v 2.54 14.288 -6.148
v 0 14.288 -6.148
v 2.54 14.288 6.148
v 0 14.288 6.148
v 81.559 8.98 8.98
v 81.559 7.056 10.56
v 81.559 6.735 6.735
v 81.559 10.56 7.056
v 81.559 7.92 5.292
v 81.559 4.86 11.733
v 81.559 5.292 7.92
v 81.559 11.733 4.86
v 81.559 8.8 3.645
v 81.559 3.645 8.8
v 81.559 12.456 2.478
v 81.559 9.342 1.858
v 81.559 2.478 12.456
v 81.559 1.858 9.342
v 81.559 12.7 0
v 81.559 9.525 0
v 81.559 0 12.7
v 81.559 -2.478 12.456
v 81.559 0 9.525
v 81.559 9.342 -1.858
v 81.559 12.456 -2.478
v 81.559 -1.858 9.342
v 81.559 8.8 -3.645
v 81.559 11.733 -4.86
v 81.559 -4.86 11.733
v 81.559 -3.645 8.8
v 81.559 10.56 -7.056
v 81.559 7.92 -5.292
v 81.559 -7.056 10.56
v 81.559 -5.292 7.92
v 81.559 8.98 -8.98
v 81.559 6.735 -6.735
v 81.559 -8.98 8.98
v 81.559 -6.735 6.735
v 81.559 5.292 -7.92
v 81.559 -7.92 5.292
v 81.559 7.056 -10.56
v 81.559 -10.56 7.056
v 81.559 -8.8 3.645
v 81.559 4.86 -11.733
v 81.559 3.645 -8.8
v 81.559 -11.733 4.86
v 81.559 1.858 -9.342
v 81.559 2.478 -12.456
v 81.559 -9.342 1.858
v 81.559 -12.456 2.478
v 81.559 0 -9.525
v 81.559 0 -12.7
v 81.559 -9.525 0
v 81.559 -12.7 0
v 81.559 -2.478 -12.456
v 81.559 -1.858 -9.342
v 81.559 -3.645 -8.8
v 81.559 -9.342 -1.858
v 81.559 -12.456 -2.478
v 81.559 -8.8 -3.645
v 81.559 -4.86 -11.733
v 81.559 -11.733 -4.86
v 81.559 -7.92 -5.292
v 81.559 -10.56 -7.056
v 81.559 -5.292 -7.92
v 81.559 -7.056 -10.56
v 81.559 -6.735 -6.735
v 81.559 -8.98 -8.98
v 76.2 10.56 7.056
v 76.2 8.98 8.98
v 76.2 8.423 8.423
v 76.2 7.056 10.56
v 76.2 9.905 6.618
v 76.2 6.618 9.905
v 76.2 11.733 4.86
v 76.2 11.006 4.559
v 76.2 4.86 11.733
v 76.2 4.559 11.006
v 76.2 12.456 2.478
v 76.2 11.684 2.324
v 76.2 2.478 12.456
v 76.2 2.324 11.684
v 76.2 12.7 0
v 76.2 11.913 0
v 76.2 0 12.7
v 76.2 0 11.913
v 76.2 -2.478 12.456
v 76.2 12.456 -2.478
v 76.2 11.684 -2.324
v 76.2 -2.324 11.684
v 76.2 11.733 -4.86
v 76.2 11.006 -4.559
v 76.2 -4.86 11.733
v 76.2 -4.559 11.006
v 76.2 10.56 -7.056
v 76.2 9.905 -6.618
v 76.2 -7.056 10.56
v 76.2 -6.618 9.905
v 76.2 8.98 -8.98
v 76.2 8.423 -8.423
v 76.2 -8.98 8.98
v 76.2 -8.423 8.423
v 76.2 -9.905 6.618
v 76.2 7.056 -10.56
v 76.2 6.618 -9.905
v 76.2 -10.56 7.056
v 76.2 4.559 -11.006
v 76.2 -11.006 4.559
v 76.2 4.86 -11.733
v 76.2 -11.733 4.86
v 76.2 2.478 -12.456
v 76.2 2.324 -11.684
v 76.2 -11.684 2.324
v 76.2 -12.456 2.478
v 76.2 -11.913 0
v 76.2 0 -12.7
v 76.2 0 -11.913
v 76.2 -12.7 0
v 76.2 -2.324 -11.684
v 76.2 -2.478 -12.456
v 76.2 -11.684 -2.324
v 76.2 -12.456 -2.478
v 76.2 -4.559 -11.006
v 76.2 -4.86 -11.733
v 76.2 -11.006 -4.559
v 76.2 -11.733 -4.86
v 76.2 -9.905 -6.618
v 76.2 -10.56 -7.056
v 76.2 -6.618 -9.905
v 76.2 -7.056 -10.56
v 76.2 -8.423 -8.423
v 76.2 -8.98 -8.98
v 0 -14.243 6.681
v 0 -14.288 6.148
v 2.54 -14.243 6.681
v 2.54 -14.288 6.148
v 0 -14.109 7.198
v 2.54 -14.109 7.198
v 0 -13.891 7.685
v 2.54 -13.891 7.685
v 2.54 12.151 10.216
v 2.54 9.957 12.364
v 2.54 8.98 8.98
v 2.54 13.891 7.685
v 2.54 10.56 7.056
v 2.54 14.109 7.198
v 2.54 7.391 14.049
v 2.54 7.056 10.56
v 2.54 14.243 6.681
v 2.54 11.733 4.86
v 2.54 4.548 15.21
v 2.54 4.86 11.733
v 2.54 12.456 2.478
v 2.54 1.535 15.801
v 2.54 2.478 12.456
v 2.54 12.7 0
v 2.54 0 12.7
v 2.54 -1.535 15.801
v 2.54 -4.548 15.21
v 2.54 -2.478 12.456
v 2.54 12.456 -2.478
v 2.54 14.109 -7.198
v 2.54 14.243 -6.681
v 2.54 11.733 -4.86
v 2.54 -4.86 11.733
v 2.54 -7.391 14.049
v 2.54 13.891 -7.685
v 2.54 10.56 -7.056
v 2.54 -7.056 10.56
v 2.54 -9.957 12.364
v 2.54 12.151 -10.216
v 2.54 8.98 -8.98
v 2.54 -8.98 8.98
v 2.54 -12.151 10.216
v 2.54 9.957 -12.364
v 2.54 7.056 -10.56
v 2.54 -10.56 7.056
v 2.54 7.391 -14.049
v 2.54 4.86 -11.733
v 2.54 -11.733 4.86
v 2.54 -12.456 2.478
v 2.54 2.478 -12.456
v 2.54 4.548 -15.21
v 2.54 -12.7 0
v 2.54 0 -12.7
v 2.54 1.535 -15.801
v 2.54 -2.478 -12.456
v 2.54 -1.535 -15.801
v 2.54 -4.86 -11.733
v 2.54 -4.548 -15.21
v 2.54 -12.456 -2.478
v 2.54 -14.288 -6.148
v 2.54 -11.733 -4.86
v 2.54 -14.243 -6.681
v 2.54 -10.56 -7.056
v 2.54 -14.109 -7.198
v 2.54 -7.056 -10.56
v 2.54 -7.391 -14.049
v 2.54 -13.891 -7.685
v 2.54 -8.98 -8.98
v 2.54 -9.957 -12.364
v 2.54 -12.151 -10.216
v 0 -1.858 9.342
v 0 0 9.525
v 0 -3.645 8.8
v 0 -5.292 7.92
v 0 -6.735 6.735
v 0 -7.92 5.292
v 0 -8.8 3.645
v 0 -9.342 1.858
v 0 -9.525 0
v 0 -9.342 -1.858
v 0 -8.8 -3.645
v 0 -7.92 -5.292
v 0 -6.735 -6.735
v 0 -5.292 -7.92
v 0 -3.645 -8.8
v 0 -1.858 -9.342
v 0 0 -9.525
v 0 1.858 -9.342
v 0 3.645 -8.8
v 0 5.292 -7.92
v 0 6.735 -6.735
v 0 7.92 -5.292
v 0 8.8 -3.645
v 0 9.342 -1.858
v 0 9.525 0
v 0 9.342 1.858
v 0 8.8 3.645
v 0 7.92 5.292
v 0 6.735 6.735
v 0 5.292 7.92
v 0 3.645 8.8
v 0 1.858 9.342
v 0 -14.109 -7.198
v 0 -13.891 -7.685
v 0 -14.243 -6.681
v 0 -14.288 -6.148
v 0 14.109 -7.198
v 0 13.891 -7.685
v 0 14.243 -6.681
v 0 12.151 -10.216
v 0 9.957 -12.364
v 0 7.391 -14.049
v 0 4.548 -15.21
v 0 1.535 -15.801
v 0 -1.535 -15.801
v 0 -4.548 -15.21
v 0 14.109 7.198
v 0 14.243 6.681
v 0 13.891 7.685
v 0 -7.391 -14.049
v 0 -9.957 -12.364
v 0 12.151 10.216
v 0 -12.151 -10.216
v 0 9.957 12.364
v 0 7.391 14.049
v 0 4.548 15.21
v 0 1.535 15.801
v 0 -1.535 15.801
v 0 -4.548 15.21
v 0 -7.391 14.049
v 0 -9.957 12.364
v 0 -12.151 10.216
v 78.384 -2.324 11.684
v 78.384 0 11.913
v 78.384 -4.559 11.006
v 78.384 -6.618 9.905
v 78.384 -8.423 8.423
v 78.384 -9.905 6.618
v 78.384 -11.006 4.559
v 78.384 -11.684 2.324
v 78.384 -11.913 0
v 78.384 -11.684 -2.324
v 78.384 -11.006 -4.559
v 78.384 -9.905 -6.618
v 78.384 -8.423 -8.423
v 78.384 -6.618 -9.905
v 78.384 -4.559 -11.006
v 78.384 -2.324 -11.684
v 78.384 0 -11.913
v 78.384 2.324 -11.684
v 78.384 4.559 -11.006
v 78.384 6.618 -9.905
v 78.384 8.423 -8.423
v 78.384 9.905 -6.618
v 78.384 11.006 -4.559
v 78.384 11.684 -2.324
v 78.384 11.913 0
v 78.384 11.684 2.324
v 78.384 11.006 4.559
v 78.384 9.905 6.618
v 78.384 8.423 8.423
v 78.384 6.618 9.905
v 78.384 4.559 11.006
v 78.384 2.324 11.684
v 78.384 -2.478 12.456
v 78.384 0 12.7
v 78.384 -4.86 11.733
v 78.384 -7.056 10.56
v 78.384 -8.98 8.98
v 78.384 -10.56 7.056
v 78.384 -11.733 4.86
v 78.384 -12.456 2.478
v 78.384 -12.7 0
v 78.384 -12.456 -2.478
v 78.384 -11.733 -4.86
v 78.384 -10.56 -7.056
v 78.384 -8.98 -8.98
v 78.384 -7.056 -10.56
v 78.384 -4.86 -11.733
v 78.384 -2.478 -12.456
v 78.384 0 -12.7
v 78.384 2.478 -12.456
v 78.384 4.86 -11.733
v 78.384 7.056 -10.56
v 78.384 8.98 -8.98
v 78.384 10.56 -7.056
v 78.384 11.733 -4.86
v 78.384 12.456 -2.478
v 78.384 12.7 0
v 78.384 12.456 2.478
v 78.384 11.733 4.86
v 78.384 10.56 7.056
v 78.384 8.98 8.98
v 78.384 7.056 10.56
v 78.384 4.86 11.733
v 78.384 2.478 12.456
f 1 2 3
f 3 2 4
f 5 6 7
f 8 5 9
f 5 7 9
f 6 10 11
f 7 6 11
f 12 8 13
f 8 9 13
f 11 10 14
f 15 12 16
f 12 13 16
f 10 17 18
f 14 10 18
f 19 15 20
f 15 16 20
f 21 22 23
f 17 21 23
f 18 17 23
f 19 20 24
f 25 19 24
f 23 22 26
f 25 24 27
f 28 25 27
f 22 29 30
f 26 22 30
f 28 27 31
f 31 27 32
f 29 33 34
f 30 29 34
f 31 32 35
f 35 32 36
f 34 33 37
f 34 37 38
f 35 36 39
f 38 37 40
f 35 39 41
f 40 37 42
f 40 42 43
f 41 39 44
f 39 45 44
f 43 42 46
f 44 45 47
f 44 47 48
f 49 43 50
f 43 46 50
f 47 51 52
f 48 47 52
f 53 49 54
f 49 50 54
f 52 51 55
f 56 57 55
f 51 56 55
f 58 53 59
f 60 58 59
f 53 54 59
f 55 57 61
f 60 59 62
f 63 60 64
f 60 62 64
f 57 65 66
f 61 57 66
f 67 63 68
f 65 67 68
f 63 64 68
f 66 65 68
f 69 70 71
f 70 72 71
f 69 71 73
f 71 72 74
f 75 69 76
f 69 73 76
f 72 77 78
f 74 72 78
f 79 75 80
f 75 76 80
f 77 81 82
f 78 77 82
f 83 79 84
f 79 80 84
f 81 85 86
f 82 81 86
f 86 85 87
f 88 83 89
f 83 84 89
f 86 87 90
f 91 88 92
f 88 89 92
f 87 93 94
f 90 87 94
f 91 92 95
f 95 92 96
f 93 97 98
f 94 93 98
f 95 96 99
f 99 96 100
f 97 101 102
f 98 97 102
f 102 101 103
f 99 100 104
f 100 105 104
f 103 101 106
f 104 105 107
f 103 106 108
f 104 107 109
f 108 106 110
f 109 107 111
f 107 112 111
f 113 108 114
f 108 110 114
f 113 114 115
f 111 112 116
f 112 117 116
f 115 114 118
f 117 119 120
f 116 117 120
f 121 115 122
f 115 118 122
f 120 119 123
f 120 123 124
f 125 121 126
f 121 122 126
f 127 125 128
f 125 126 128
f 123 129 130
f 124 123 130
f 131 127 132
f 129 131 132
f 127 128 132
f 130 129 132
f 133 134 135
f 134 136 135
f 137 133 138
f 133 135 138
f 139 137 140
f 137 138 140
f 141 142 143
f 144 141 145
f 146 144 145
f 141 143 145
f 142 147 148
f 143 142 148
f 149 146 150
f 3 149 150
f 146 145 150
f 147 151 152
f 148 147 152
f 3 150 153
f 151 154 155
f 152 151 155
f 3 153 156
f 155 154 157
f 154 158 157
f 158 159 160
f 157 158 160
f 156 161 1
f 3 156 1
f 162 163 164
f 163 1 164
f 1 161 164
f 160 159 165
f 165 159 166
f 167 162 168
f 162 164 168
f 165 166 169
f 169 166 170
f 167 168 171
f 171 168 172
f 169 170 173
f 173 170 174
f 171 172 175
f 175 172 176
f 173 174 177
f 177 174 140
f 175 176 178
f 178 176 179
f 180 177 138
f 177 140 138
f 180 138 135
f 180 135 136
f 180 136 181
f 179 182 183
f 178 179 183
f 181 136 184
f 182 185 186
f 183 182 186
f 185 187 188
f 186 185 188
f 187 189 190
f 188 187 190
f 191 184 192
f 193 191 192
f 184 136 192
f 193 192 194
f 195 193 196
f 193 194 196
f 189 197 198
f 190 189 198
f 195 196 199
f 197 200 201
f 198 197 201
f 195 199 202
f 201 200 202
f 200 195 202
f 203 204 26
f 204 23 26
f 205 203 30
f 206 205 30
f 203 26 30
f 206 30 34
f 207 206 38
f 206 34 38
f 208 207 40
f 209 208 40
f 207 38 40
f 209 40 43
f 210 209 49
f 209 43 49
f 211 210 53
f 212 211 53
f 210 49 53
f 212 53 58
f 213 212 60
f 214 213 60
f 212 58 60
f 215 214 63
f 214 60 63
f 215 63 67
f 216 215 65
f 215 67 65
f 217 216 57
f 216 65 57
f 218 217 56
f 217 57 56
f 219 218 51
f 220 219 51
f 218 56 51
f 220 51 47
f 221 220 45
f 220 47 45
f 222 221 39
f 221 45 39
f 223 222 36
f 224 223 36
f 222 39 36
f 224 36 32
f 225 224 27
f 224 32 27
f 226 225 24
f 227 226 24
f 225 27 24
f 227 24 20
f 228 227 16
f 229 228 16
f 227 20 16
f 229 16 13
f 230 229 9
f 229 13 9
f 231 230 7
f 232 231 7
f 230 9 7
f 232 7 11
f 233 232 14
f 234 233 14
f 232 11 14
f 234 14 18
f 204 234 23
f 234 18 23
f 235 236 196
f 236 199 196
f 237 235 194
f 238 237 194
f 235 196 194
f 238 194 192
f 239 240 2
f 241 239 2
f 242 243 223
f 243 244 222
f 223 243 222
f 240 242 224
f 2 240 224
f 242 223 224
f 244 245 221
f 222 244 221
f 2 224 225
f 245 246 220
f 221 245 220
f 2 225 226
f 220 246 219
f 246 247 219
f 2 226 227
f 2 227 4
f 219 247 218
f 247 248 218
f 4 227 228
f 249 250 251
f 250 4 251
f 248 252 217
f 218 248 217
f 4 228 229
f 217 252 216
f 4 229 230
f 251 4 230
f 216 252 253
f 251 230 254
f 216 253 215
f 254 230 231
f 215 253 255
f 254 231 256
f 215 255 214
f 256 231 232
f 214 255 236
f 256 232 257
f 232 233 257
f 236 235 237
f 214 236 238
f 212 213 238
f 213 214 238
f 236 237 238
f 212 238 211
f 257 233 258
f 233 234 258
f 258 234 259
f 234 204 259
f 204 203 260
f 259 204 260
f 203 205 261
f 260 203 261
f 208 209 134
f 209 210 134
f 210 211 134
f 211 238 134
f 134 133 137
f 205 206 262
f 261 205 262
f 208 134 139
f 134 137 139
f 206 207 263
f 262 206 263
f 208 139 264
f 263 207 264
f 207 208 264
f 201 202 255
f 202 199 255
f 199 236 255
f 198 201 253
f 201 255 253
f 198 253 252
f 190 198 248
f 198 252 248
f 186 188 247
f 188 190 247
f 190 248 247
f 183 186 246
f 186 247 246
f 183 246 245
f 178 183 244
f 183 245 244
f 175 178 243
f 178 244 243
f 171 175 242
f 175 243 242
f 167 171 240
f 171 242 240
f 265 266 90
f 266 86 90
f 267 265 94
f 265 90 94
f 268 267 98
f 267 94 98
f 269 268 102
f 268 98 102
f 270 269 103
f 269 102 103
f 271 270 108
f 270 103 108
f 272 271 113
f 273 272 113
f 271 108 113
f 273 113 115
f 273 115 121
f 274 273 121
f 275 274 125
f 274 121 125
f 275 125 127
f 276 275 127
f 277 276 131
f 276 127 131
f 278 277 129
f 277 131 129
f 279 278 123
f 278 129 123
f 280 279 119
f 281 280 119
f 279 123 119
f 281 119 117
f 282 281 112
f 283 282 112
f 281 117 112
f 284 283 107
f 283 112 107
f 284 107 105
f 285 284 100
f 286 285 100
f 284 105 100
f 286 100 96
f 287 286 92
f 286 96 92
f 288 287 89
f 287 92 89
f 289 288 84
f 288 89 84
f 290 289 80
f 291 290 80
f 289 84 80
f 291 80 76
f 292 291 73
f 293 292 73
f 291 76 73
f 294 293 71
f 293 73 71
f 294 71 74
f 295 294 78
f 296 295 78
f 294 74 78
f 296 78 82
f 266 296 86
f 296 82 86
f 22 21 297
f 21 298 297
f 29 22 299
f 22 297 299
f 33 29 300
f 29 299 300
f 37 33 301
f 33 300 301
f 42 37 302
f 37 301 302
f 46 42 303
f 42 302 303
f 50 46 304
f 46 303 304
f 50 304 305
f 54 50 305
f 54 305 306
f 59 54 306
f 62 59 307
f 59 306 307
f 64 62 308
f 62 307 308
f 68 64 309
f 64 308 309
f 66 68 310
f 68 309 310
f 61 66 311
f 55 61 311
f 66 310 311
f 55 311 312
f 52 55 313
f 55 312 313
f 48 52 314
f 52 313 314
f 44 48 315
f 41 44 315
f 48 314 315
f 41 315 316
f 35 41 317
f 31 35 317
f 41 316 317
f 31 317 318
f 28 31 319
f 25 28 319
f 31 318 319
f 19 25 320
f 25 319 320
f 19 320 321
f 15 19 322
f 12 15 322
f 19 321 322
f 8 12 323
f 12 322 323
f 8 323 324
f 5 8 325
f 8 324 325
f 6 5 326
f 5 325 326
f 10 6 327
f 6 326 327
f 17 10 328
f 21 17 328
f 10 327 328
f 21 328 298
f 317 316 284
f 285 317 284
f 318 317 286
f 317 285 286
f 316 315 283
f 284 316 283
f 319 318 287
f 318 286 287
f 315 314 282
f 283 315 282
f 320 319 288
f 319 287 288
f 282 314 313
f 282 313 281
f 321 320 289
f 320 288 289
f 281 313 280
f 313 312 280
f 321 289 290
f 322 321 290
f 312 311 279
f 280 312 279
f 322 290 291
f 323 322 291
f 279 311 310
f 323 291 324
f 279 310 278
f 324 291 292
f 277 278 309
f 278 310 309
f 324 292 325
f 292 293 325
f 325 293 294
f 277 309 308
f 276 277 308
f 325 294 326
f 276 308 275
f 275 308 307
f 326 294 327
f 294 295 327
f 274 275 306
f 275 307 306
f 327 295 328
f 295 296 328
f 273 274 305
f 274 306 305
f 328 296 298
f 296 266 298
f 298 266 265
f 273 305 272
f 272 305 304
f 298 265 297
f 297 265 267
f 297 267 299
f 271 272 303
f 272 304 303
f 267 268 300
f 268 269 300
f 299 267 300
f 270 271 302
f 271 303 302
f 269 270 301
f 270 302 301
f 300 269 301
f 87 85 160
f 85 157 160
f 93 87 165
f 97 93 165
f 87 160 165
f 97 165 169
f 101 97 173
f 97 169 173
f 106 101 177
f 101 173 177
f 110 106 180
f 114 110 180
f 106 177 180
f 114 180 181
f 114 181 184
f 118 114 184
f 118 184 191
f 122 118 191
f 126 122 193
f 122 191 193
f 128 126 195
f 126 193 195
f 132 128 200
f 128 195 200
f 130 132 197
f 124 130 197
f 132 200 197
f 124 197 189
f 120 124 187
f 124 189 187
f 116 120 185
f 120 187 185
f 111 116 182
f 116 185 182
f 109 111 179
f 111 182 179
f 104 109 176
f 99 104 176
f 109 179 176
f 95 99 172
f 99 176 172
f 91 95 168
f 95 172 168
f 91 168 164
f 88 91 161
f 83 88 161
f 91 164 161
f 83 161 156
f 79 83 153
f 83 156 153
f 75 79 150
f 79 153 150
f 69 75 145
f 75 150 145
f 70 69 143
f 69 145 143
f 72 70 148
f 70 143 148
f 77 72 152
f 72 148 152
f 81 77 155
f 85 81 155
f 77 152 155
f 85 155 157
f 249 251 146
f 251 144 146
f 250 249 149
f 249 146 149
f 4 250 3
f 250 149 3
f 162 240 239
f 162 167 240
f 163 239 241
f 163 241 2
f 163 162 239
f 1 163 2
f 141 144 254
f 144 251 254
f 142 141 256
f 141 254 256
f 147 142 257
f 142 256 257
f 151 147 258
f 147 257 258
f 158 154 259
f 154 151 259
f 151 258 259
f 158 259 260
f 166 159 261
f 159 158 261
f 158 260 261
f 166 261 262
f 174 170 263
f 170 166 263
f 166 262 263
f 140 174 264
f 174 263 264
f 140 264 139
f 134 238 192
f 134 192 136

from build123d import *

# Parameters (mm, degrees)
CUT_EXTRUDE1_REACH = 86.593
SKETCH2_W          = 13.839504146
SKETCH2_H          = 1.5875
FILLET1_R          = 3.175


with BuildPart() as part:
    # Sketch1 → Revolve1 (revolve)
    with BuildSketch(Plane.XY, mode=Mode.PRIVATE) as revolve1_sk:
        Polygon((0, 9.525), (81.5594, 9.525), (81.5594, 12.7), (78.3844, 12.7), (78.3844, 11.9126), (76.2, 11.9126), (76.2, 12.7), (2.54, 12.7), (2.54, 15.875), (0, 15.875), align=None)
    revolve(revolve1_sk.sketch.rotate(Axis((0, 0, 0), (1, 0, 0)), 90), axis=Axis((0, 0, 0), (1, 0, 0)))

    # Sketch2 → Cut-Extrude1 (cut, up to next)
    with BuildSketch(Plane.ZY, mode=Mode.PRIVATE) as cut_extrude1_sk1:
        with Locations((0, 15.08125)):
            Rectangle(SKETCH2_W, SKETCH2_H)
    cut_extrude1_tool1 = extrude(cut_extrude1_sk1.sketch, amount=-CUT_EXTRUDE1_REACH, mode=Mode.PRIVATE) & part.part
    # Sketch2 → Cut-Extrude1 (cut, up to next)
    with BuildSketch(Plane.ZY, mode=Mode.PRIVATE) as cut_extrude1_sk2:
        with Locations((0, -15.08125)):
            Rectangle(SKETCH2_W, SKETCH2_H)
    cut_extrude1_tool2 = extrude(cut_extrude1_sk2.sketch, amount=-CUT_EXTRUDE1_REACH, mode=Mode.PRIVATE) & part.part
    add(cut_extrude1_tool1.solids().sort_by_distance((0, 15.08125, 0))[0], mode=Mode.SUBTRACT)
    add(cut_extrude1_tool2.solids().sort_by_distance((0, -15.08125, 0))[0], mode=Mode.SUBTRACT)

    # Fillet1
    fillet1_edges = [part.edges().sort_by_distance(p)[0] for p in [
        (1.27, 14.2875, -6.919752073),
        (1.27, 14.2875, 6.919752073),
        (1.27, -14.2875, -6.919752073),
        (1.27, -14.2875, 6.919752073),
    ]]
    fillet(fillet1_edges, radius=FILLET1_R)


solid = part.part
